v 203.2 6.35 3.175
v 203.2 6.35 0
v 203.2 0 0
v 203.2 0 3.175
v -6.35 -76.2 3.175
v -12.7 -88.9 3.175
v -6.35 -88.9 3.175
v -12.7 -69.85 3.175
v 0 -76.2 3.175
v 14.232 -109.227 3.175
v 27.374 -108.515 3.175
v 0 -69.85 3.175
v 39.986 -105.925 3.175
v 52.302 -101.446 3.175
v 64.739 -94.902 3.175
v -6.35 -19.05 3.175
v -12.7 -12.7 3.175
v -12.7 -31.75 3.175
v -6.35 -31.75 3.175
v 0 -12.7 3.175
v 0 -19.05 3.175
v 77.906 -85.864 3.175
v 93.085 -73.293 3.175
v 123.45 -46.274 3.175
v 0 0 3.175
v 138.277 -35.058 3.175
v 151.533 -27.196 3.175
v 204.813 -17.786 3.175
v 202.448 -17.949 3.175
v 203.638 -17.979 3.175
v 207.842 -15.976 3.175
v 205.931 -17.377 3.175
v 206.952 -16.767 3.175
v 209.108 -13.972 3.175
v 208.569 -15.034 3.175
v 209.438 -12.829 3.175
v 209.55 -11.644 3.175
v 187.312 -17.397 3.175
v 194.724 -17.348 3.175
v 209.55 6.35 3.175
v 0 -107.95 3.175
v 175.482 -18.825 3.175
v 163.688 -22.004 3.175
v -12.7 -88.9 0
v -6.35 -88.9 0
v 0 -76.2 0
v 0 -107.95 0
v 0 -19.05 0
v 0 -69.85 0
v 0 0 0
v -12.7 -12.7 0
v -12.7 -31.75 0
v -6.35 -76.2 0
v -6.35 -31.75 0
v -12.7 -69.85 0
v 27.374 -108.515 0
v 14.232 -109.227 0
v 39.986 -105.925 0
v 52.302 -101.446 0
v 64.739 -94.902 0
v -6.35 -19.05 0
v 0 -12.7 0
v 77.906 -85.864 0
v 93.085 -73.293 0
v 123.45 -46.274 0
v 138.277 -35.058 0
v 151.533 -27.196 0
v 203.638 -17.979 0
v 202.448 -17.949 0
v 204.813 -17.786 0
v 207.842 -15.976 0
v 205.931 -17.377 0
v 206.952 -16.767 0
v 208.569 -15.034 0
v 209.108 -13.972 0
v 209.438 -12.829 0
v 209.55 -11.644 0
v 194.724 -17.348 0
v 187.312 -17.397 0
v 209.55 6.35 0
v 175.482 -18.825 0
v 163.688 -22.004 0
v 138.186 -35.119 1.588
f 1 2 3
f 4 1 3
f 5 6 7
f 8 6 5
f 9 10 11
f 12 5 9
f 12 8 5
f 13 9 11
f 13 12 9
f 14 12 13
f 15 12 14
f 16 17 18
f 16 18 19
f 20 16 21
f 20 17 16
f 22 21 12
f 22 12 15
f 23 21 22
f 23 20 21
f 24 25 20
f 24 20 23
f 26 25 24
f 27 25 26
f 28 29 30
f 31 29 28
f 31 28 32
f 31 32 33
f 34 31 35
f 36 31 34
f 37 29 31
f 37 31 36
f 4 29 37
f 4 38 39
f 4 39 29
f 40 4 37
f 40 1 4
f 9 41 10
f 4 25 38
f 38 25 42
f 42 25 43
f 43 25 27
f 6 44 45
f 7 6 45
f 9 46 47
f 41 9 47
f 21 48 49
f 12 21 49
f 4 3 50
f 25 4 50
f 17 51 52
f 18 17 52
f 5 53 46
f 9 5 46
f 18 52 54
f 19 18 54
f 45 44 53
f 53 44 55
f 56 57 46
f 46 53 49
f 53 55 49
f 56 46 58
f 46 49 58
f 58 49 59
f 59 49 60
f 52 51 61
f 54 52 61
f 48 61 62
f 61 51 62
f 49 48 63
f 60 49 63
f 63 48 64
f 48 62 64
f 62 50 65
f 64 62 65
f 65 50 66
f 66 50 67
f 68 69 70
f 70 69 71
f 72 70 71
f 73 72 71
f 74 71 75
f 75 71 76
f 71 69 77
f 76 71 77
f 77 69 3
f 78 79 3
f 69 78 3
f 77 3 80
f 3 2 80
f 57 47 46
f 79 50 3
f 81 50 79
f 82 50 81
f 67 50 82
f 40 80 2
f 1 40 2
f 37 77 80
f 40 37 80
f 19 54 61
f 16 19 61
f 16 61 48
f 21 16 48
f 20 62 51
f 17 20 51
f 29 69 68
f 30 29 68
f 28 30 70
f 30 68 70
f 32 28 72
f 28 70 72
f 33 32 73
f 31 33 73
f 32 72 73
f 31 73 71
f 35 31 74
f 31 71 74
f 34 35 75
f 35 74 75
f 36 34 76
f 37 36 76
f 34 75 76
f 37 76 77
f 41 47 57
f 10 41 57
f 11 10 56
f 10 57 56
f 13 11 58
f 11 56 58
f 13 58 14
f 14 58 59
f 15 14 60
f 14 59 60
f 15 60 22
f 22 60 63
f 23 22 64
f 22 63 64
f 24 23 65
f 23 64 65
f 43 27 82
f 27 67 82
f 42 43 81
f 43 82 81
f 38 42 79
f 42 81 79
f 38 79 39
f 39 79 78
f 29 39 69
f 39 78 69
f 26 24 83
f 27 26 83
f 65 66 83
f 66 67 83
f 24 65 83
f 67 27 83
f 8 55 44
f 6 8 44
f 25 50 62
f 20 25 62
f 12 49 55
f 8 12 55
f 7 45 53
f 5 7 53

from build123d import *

# Parameters (mm, degrees)
BOSS_EXTRUDE1_DEPTH = 3.175


with BuildPart() as part:
    # Sketch1 → Boss-Extrude1 (new body)
    with BuildSketch(Plane.XY):
        with BuildLine():
            Line((0, 0), (0, -12.7))
            Line((0, -12.7), (-12.7, -12.7))
            Line((-12.7, -12.7), (-12.7, -31.75))
            Line((-12.7, -31.75), (-6.35, -31.75))
            Line((-6.35, -31.75), (-6.35, -19.05))
            Line((-6.35, -19.05), (0, -19.05))
            Line((0, -19.05), (0, -69.85))
            Line((0, -69.85), (-12.7, -69.85))
            Line((-12.7, -69.85), (-12.7, -88.9))
            Line((-12.7, -88.9), (-6.35, -88.9))
            Line((-6.35, -88.9), (-6.35, -76.2))
            Line((-6.35, -76.2), (0, -76.2))
            Line((0, -76.2), (0, -107.95))
            add(Edge.make_bspline(
                [(0, -107.95), (64.972882445, -118.248903815), (107.260828457, -42.040801067), (176.720157179, -14.882540639), (202.4483901, -17.949390151)],
                knots=[0, 0, 0, 0, 0.687412436, 0.974132151, 0.974132151, 0.974132151, 0.974132151], degree=3))
            ThreePointArc((202.4483901, -17.949390151), (207.416027581, -16.392461261), (209.55, -11.644028737))
            Line((209.55, -11.644028737), (209.55, 6.35))
            Line((209.55, 6.35), (203.2, 6.35))
            Line((203.2, 6.35), (203.2, 0))
            Line((203.2, 0), (0, 0))
        make_face()
    extrude(amount=BOSS_EXTRUDE1_DEPTH)


solid = part.part
